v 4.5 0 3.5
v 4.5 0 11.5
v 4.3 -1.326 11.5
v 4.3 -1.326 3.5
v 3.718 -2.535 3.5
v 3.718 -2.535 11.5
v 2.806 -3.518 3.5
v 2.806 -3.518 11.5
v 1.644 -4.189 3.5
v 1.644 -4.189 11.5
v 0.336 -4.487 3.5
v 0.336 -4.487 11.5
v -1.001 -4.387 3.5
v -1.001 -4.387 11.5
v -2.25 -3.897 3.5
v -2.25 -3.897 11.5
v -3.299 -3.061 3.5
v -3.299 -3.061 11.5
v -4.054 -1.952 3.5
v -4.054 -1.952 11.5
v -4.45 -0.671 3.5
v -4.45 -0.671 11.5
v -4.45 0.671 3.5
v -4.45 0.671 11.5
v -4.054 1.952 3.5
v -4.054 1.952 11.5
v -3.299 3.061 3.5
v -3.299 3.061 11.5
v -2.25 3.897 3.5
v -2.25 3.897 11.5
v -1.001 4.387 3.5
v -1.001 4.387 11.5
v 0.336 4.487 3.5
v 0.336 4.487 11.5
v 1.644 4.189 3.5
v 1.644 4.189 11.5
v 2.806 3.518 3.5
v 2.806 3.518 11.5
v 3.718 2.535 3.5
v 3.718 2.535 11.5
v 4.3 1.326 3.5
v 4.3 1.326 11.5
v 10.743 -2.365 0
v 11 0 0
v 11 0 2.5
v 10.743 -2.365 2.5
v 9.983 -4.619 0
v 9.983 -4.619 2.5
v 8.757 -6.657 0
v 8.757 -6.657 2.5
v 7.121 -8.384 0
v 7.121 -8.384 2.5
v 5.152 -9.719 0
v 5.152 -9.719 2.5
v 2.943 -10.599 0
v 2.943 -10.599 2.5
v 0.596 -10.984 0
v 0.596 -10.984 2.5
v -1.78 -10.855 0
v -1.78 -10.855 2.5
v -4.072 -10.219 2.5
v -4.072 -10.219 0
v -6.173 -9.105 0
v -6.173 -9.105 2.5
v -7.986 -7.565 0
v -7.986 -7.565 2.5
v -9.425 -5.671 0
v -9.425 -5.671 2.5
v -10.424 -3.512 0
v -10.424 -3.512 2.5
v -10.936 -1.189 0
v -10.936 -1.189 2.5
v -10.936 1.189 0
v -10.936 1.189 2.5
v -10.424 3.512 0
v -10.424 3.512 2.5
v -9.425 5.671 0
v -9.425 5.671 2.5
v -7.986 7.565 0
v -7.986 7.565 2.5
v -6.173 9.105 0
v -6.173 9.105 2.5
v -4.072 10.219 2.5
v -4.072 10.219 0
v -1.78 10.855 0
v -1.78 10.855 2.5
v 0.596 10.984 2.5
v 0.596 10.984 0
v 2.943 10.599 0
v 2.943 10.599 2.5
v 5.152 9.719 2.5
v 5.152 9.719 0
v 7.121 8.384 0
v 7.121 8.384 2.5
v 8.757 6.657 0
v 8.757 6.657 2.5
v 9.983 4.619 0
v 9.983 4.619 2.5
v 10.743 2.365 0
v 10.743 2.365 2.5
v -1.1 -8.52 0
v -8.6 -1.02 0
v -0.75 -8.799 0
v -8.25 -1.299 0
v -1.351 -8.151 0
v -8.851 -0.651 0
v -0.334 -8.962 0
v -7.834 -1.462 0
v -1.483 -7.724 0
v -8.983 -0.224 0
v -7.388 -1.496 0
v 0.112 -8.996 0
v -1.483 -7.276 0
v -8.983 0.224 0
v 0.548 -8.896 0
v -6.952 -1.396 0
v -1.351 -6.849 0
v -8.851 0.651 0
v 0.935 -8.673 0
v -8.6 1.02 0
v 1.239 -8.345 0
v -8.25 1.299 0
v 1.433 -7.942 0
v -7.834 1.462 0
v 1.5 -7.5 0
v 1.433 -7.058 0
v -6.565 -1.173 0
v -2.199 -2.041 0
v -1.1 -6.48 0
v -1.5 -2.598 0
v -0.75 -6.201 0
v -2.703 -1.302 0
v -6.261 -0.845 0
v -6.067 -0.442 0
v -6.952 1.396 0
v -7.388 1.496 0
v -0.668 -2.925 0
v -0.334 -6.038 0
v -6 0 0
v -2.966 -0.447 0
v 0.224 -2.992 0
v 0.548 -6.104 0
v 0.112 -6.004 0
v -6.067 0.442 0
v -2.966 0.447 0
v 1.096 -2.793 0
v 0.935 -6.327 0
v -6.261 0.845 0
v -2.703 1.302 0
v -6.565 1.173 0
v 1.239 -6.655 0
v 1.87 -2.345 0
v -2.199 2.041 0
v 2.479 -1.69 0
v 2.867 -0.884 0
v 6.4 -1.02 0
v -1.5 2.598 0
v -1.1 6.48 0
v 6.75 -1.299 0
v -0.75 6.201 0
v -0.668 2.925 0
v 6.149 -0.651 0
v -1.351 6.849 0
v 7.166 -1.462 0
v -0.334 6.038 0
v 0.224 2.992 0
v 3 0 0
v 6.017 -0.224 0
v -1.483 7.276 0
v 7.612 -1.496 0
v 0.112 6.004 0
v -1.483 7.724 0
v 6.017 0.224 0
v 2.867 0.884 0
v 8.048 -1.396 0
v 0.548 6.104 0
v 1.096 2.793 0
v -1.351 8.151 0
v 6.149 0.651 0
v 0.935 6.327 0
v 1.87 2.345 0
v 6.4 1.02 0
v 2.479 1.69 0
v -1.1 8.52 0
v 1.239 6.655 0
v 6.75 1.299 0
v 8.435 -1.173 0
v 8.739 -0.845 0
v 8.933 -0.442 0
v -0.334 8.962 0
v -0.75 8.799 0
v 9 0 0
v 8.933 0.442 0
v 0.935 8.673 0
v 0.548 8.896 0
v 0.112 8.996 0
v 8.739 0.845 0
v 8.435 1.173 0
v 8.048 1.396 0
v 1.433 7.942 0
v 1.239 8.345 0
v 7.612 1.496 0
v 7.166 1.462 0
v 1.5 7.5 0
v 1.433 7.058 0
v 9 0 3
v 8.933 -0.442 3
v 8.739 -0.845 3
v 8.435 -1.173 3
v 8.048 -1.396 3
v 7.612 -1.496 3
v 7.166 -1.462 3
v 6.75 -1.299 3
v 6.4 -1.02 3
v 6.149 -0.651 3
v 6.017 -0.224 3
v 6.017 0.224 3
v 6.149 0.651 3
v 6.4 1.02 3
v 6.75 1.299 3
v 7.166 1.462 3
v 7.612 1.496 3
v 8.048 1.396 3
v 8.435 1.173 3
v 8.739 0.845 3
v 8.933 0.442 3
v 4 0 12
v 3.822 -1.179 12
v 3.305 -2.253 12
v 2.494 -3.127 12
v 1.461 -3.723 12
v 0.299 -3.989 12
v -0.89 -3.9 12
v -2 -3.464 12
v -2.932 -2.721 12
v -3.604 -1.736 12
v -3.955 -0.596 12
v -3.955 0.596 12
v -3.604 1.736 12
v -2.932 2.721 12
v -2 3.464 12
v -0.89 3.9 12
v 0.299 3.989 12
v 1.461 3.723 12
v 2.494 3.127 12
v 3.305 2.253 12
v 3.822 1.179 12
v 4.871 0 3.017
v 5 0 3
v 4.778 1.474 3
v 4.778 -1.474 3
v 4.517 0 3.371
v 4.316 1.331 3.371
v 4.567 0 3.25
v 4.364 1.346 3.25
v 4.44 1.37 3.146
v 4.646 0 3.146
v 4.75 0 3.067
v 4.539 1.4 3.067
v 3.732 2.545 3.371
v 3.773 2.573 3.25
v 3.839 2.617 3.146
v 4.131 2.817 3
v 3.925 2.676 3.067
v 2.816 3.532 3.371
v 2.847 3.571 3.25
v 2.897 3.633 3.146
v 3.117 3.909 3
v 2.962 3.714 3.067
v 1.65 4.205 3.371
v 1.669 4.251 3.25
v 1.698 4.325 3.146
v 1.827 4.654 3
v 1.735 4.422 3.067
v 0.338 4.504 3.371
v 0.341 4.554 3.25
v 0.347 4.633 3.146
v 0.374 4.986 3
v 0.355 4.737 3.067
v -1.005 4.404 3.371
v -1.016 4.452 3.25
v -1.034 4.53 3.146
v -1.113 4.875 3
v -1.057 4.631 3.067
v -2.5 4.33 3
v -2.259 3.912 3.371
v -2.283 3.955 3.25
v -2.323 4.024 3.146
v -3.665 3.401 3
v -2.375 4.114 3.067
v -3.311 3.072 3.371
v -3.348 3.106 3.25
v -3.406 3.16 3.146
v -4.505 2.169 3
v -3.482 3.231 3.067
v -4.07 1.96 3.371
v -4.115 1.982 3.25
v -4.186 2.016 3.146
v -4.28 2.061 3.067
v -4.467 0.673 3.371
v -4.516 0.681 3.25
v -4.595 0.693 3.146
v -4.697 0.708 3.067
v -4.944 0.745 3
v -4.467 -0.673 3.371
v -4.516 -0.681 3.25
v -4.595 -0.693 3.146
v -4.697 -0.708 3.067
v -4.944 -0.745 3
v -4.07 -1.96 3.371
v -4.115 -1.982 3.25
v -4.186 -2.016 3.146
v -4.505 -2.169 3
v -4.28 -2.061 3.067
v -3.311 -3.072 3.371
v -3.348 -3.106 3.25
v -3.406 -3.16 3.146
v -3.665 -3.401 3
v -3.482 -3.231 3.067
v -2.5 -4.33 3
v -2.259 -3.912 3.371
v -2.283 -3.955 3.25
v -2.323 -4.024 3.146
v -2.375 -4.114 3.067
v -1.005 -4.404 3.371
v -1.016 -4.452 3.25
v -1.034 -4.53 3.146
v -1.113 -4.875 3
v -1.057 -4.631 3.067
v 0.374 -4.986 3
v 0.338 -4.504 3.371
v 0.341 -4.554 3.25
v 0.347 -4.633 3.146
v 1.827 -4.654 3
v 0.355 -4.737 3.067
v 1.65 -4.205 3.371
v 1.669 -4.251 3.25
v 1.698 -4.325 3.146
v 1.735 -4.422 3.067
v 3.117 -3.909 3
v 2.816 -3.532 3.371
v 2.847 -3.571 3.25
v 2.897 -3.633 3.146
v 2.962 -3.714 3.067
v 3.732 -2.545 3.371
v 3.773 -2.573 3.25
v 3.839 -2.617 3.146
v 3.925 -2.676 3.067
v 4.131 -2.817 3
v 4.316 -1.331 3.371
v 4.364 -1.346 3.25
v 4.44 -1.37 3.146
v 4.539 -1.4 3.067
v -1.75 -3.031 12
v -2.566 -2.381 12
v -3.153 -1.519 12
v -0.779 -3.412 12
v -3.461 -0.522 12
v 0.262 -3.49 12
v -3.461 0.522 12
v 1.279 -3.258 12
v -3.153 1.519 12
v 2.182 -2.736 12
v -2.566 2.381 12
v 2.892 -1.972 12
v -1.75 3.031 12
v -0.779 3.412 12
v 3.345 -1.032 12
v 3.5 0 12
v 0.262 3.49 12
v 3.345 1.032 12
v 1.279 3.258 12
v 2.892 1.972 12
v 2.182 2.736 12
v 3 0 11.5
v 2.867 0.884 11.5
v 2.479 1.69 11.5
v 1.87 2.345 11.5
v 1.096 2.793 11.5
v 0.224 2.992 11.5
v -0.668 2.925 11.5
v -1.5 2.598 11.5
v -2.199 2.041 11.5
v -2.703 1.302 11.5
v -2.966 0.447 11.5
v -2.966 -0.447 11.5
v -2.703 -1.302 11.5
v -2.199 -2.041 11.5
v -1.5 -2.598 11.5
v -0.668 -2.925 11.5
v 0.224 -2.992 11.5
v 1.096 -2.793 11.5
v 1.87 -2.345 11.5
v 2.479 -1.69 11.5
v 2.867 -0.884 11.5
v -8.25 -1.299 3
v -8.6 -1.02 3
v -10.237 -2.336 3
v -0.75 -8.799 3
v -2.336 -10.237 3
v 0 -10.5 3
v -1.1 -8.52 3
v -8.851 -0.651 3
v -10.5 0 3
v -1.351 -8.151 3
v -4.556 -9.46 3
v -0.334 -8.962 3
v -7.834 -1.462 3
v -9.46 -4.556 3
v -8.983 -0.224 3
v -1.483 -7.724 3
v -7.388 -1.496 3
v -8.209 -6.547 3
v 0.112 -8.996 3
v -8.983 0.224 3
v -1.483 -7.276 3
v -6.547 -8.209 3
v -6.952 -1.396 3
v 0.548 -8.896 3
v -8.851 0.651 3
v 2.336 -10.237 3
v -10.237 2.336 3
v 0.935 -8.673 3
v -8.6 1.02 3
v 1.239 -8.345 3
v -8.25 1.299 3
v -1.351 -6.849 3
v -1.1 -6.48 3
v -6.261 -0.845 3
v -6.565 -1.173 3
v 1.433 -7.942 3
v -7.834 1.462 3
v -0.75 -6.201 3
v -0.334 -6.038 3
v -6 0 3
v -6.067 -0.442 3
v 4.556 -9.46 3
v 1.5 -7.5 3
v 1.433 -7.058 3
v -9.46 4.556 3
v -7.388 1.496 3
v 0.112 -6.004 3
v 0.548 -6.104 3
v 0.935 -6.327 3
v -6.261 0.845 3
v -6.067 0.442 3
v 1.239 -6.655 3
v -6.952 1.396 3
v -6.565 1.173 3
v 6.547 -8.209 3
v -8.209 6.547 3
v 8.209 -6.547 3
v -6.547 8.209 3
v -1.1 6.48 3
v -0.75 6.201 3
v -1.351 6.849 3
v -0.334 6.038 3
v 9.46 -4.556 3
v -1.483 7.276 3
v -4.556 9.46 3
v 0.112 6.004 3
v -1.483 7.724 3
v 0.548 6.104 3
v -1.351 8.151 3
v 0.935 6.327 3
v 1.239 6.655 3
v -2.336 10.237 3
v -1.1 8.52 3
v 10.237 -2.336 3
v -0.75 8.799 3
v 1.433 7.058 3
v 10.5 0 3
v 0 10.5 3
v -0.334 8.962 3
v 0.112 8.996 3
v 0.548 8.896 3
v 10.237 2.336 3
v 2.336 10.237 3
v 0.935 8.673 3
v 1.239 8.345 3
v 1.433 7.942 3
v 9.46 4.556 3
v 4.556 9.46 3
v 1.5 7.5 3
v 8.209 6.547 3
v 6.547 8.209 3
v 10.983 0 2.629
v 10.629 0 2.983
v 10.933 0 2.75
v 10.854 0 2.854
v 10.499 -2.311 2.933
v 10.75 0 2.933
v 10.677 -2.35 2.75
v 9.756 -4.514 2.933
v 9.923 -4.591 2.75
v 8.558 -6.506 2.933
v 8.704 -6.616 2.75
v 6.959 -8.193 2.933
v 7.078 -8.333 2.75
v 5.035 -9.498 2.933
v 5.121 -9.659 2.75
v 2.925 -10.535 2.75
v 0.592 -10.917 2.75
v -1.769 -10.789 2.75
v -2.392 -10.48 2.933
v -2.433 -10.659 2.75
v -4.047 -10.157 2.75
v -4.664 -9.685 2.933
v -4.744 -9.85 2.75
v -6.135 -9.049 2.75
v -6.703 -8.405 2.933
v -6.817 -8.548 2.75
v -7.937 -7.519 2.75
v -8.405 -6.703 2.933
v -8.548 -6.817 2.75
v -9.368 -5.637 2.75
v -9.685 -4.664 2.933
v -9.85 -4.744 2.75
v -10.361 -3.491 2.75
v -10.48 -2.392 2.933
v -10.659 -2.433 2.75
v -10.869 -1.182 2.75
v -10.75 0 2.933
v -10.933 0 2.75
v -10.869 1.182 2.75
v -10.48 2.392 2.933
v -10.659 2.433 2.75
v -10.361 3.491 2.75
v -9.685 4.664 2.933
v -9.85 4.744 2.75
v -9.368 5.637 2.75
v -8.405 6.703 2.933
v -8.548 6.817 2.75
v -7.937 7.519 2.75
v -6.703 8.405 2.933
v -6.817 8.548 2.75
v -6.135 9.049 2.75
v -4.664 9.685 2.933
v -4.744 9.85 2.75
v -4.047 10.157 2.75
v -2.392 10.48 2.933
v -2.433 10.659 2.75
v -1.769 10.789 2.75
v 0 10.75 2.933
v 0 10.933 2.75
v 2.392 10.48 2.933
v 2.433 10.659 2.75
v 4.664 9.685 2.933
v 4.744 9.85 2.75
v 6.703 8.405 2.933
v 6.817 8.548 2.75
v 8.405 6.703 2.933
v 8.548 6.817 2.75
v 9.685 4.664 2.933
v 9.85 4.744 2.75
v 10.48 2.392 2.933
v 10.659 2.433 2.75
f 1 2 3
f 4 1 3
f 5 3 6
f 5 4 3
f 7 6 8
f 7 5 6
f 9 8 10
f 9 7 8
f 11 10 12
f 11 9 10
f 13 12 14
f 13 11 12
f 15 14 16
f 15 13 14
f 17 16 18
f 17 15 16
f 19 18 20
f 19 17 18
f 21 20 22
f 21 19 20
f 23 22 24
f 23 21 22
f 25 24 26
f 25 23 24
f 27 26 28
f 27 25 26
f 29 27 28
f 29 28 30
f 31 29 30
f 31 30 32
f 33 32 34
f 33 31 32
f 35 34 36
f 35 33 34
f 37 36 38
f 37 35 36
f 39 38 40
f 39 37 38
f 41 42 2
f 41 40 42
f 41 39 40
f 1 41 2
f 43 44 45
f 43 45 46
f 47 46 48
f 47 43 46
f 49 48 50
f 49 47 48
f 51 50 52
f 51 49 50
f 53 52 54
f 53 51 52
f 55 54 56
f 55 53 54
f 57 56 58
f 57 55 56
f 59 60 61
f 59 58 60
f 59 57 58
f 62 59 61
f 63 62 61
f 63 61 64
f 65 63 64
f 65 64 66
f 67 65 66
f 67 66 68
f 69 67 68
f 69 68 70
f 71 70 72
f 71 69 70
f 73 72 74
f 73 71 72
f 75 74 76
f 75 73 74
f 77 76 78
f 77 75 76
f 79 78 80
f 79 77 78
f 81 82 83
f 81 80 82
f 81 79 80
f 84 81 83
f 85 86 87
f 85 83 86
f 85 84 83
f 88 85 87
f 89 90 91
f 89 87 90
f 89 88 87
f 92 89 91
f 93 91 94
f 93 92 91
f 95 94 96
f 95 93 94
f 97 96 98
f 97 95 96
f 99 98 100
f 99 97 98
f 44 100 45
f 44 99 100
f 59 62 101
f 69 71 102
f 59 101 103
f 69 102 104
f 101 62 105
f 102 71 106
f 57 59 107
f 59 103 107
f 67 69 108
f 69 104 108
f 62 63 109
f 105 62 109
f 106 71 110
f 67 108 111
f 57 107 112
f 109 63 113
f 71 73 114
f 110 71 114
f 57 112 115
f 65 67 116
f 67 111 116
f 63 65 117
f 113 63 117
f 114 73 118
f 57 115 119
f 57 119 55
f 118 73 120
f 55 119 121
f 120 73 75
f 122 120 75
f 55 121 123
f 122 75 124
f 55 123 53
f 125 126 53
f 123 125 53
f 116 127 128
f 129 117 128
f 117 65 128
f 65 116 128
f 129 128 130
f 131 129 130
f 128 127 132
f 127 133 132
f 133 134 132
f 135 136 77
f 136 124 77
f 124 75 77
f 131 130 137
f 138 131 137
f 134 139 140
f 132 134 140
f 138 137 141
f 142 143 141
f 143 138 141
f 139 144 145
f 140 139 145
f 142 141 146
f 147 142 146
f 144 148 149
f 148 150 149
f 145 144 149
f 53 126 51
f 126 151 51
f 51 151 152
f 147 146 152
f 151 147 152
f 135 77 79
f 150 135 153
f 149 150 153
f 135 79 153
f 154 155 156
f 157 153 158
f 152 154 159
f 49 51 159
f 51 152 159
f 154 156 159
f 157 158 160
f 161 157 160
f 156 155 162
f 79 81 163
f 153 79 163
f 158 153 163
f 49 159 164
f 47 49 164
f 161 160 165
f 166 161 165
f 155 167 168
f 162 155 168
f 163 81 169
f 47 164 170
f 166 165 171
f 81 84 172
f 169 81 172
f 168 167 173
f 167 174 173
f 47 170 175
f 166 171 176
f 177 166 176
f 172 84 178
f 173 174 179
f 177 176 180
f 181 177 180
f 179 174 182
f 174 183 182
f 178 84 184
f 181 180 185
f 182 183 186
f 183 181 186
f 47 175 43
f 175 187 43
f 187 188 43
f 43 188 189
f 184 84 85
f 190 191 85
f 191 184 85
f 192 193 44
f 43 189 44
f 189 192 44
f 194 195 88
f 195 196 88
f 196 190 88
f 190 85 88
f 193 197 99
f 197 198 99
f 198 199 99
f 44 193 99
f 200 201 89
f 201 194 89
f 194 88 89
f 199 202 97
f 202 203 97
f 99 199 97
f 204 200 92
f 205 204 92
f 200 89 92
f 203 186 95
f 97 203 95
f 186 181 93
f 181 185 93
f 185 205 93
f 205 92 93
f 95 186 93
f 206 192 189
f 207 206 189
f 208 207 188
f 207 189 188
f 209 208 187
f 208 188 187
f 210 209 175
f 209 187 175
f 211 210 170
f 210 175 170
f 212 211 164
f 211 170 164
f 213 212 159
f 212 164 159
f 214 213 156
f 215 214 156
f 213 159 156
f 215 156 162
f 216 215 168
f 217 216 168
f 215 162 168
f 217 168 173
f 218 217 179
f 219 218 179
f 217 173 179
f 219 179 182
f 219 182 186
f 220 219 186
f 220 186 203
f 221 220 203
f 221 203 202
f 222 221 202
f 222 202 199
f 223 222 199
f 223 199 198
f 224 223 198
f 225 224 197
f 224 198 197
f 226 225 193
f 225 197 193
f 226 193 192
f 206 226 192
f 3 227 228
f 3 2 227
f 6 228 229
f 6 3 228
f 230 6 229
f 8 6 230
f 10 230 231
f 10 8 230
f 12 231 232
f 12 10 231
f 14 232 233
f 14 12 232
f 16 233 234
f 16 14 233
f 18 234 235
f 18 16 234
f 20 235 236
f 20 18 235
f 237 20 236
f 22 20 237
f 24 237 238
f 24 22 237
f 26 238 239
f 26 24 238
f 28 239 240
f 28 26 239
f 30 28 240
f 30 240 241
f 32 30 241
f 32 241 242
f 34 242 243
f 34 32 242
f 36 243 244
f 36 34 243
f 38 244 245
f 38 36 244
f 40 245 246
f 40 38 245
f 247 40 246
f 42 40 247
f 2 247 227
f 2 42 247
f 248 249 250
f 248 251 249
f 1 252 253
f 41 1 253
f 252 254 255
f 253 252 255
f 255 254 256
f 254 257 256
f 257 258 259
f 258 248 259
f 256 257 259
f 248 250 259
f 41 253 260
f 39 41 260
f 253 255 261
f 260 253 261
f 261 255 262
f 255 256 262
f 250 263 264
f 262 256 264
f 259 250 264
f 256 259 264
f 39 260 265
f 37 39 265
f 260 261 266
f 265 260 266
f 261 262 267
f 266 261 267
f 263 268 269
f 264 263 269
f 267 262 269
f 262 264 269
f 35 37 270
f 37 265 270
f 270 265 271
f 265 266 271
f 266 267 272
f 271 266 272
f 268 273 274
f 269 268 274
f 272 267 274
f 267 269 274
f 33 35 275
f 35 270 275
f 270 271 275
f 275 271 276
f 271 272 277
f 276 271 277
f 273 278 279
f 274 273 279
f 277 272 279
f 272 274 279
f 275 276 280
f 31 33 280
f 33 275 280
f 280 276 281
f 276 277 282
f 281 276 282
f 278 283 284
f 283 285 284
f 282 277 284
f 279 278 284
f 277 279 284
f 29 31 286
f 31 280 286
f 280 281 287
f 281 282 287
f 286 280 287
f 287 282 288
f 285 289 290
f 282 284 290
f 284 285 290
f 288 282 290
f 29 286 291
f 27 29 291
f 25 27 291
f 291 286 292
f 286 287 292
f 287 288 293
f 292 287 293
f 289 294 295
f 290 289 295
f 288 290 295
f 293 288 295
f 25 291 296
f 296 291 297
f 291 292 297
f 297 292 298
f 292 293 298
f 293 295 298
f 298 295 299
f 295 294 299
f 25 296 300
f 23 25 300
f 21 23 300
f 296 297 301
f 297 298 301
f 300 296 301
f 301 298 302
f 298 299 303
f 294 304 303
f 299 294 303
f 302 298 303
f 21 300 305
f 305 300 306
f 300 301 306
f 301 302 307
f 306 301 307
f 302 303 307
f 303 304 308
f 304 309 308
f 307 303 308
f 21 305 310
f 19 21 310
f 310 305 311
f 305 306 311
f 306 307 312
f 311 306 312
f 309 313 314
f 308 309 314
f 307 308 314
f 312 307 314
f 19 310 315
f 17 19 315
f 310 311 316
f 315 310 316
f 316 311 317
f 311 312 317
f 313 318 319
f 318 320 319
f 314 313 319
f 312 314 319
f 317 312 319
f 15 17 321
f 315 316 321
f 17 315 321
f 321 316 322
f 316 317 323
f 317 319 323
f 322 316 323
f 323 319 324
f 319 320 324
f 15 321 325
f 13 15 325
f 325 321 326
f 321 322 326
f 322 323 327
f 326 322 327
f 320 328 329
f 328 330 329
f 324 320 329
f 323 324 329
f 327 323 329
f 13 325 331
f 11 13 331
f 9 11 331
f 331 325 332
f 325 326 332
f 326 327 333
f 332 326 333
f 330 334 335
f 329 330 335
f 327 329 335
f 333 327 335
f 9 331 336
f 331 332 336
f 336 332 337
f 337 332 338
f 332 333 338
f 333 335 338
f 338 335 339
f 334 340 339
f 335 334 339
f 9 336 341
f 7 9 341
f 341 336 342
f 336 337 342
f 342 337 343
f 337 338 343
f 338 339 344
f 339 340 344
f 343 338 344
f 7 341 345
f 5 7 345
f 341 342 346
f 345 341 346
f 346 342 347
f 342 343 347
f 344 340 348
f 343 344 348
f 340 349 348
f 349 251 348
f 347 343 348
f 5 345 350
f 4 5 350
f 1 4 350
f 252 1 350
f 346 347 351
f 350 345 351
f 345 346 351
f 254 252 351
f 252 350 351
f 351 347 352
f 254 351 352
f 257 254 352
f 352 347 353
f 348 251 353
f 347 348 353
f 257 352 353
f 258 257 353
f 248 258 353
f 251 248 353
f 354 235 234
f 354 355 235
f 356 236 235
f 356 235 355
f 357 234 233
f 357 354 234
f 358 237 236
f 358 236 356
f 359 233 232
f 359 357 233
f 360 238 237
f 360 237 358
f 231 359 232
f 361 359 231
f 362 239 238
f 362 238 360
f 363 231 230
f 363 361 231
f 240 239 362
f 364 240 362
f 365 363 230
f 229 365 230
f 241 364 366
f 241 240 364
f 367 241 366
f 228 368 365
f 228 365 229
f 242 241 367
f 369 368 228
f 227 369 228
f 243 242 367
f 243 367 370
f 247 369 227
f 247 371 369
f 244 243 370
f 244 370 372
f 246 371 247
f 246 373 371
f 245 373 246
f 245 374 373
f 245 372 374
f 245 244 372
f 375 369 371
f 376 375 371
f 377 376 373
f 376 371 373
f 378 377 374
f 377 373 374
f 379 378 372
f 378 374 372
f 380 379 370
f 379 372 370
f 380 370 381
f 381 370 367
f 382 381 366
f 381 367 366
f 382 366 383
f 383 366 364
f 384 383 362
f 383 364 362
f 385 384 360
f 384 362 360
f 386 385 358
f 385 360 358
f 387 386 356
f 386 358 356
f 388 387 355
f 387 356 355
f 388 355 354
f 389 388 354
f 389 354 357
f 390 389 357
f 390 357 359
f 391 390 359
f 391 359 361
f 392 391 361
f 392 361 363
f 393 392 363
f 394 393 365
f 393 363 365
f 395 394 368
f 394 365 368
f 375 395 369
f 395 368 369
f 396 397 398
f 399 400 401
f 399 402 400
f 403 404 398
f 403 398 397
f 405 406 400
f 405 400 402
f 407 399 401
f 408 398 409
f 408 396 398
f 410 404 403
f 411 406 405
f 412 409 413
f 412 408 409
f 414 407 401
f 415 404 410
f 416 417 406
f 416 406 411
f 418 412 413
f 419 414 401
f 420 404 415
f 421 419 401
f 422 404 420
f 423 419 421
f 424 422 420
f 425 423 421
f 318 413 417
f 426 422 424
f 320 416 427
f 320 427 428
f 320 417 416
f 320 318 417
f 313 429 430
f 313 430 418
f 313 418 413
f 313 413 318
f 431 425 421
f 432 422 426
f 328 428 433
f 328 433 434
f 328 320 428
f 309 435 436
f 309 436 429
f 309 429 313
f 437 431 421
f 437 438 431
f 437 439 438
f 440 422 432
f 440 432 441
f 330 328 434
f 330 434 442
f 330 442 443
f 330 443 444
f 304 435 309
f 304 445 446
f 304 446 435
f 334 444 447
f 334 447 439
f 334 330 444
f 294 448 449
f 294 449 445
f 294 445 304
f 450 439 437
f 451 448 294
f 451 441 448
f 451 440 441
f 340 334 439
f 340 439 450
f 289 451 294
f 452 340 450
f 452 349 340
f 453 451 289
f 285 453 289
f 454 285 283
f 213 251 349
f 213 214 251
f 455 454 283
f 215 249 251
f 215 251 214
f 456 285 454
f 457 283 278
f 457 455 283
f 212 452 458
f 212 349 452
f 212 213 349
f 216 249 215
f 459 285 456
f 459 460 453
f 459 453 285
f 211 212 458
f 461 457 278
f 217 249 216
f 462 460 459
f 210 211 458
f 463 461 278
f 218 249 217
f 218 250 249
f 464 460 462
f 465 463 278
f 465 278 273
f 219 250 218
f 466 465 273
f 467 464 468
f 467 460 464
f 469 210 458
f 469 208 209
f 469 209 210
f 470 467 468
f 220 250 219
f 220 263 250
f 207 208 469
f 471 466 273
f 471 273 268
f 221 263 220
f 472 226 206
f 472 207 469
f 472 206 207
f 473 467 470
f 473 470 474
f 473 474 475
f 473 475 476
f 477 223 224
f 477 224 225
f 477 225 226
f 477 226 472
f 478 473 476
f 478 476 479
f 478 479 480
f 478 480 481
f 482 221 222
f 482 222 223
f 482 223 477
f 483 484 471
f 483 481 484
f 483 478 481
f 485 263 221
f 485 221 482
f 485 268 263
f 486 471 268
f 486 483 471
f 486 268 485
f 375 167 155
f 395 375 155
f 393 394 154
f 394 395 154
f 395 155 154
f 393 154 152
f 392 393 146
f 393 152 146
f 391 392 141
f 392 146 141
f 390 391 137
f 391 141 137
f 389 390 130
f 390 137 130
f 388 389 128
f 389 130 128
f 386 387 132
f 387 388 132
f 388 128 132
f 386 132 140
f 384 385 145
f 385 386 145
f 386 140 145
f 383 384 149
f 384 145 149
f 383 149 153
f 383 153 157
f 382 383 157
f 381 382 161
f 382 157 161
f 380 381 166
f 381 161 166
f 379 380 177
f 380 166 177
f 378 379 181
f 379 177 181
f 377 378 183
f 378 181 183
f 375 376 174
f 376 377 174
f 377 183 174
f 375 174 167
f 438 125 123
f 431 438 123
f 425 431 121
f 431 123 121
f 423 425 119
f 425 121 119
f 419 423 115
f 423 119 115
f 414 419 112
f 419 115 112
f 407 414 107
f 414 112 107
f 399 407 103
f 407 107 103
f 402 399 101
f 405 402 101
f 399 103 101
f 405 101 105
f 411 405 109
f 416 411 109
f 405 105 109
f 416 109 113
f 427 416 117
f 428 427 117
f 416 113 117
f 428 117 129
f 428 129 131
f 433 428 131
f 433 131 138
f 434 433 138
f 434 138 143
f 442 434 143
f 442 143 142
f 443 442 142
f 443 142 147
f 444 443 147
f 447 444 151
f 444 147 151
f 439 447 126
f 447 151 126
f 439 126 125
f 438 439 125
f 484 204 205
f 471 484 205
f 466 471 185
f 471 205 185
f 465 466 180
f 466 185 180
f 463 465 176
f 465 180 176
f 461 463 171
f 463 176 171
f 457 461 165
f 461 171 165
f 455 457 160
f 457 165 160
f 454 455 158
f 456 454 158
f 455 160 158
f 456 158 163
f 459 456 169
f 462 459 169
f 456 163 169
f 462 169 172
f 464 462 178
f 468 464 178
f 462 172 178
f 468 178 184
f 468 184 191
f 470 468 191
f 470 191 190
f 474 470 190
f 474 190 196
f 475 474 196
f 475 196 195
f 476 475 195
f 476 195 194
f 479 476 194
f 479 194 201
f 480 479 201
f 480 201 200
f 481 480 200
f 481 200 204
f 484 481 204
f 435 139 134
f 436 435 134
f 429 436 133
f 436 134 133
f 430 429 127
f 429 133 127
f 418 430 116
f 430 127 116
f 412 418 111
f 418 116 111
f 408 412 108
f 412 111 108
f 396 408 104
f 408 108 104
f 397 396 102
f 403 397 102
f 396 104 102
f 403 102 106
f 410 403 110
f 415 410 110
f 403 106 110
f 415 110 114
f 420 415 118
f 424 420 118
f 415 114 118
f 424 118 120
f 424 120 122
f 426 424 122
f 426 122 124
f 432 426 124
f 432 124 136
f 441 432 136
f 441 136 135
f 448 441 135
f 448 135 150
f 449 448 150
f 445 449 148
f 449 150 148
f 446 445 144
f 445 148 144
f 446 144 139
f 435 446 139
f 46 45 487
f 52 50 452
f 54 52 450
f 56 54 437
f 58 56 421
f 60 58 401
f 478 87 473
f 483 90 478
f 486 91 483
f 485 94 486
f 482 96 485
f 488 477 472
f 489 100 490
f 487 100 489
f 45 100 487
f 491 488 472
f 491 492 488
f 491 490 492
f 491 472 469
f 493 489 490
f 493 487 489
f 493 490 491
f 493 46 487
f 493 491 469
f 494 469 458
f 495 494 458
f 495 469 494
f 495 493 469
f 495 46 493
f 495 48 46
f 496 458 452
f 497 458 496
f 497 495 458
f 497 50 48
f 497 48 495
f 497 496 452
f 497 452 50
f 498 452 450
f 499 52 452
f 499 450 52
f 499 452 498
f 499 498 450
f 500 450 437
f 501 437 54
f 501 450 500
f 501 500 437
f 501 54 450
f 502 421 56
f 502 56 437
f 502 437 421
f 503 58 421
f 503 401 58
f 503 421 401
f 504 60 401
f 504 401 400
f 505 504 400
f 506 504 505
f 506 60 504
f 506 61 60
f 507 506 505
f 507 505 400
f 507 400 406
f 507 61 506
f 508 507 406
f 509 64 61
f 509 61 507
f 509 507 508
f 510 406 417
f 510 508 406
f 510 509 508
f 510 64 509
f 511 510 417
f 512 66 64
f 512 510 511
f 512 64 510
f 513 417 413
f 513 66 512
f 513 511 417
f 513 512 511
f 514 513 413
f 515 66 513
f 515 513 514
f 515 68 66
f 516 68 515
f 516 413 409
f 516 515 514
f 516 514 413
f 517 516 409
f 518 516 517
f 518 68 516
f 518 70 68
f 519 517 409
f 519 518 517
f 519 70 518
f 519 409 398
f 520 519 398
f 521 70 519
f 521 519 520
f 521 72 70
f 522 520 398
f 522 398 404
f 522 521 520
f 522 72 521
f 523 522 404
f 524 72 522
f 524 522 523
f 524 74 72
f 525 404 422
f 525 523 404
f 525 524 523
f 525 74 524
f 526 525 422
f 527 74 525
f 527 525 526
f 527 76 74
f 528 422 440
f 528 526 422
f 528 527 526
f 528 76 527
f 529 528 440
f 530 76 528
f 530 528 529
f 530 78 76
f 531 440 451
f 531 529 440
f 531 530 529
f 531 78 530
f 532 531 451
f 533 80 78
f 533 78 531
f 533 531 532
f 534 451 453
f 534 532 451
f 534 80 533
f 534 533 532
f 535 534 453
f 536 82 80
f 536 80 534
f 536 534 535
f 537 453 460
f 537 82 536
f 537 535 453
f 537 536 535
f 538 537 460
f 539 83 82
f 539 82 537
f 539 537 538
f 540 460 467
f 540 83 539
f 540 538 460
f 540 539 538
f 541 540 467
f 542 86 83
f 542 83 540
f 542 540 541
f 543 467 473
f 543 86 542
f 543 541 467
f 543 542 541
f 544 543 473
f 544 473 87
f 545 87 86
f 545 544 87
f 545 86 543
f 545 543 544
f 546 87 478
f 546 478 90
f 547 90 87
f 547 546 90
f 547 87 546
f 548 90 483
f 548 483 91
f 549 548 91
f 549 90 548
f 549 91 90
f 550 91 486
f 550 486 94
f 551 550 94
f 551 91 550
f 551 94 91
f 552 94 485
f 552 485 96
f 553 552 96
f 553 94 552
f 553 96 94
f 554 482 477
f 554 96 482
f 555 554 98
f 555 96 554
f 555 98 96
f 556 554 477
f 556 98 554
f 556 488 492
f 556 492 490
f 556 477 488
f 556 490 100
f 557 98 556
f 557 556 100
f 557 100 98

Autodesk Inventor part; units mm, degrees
ref_plane "YZ Plane" through (0, 0, 0) normal (1, 0, 0) x (0, 1, 0)
ref_plane "XZ Plane" through (0, 0, 0) normal (0, 1, 0) x (-1, 0, 0)
ref_plane "XY Plane" through (0, 0, 0) normal (0, 0, 1) x (1, 0, 0)
sketch "Эскиз1" plane through (0, 0, 0) normal (0, 0, 1) x (1, 0, 0)
  circle A0 centre (0, 0) radius 11
  circle A1 centre (0, 0) radius 7.5
  circle A2 centre (-7.5, 0) radius 1.5
  circle A3 centre (0, -7.5) radius 1.5
  circle A4 centre (7.5, 0) radius 1.5
  circle A5 centre (0, 7.5) radius 1.5
  circle A6 centre (0, 0) radius 3
  dimension "d1" = 15
  dimension "d0" = 22
  dimension "d2" = 3
  dimension "d5" = 360
  dimension "d7" = 6
extrude "Выдавливание1" add sketch "Эскиз1" along normal blind 3 contours A0 | A4 A1 A3 A2 A5
sketch "Эскиз2" plane through (0, 0, 3) normal (0, 0, 1) x (1, 0, 0)
  circle A0 centre (0, 0) radius 4.5
  circle A1 centre (0, 0) radius 11 projected
  circle A2 centre (0, 7.5) radius 1.5 projected
  circle A3 centre (-7.5, 0) radius 1.5 projected
  circle A4 centre (0, -7.5) radius 1.5 projected
  circle A5 centre (0, 0) radius 3 projected
  circle A6 centre (7.5, 0) radius 1.5 projected
  dimension "d10" = 9
extrude "Выдавливание2" add sketch "Эскиз2" along normal blind 9 contours A0
fillet "Сопряжение1" radius 0.5 2 edges at (-11, 0, 3) (-4.5, 0, 3)
chamfer "Фаска1" distance 0.5 angle 45 2 edges at (-4.5, 0, 12) (-3, 0, 12)
properties part number "МУФТА НА ВАЛ"
